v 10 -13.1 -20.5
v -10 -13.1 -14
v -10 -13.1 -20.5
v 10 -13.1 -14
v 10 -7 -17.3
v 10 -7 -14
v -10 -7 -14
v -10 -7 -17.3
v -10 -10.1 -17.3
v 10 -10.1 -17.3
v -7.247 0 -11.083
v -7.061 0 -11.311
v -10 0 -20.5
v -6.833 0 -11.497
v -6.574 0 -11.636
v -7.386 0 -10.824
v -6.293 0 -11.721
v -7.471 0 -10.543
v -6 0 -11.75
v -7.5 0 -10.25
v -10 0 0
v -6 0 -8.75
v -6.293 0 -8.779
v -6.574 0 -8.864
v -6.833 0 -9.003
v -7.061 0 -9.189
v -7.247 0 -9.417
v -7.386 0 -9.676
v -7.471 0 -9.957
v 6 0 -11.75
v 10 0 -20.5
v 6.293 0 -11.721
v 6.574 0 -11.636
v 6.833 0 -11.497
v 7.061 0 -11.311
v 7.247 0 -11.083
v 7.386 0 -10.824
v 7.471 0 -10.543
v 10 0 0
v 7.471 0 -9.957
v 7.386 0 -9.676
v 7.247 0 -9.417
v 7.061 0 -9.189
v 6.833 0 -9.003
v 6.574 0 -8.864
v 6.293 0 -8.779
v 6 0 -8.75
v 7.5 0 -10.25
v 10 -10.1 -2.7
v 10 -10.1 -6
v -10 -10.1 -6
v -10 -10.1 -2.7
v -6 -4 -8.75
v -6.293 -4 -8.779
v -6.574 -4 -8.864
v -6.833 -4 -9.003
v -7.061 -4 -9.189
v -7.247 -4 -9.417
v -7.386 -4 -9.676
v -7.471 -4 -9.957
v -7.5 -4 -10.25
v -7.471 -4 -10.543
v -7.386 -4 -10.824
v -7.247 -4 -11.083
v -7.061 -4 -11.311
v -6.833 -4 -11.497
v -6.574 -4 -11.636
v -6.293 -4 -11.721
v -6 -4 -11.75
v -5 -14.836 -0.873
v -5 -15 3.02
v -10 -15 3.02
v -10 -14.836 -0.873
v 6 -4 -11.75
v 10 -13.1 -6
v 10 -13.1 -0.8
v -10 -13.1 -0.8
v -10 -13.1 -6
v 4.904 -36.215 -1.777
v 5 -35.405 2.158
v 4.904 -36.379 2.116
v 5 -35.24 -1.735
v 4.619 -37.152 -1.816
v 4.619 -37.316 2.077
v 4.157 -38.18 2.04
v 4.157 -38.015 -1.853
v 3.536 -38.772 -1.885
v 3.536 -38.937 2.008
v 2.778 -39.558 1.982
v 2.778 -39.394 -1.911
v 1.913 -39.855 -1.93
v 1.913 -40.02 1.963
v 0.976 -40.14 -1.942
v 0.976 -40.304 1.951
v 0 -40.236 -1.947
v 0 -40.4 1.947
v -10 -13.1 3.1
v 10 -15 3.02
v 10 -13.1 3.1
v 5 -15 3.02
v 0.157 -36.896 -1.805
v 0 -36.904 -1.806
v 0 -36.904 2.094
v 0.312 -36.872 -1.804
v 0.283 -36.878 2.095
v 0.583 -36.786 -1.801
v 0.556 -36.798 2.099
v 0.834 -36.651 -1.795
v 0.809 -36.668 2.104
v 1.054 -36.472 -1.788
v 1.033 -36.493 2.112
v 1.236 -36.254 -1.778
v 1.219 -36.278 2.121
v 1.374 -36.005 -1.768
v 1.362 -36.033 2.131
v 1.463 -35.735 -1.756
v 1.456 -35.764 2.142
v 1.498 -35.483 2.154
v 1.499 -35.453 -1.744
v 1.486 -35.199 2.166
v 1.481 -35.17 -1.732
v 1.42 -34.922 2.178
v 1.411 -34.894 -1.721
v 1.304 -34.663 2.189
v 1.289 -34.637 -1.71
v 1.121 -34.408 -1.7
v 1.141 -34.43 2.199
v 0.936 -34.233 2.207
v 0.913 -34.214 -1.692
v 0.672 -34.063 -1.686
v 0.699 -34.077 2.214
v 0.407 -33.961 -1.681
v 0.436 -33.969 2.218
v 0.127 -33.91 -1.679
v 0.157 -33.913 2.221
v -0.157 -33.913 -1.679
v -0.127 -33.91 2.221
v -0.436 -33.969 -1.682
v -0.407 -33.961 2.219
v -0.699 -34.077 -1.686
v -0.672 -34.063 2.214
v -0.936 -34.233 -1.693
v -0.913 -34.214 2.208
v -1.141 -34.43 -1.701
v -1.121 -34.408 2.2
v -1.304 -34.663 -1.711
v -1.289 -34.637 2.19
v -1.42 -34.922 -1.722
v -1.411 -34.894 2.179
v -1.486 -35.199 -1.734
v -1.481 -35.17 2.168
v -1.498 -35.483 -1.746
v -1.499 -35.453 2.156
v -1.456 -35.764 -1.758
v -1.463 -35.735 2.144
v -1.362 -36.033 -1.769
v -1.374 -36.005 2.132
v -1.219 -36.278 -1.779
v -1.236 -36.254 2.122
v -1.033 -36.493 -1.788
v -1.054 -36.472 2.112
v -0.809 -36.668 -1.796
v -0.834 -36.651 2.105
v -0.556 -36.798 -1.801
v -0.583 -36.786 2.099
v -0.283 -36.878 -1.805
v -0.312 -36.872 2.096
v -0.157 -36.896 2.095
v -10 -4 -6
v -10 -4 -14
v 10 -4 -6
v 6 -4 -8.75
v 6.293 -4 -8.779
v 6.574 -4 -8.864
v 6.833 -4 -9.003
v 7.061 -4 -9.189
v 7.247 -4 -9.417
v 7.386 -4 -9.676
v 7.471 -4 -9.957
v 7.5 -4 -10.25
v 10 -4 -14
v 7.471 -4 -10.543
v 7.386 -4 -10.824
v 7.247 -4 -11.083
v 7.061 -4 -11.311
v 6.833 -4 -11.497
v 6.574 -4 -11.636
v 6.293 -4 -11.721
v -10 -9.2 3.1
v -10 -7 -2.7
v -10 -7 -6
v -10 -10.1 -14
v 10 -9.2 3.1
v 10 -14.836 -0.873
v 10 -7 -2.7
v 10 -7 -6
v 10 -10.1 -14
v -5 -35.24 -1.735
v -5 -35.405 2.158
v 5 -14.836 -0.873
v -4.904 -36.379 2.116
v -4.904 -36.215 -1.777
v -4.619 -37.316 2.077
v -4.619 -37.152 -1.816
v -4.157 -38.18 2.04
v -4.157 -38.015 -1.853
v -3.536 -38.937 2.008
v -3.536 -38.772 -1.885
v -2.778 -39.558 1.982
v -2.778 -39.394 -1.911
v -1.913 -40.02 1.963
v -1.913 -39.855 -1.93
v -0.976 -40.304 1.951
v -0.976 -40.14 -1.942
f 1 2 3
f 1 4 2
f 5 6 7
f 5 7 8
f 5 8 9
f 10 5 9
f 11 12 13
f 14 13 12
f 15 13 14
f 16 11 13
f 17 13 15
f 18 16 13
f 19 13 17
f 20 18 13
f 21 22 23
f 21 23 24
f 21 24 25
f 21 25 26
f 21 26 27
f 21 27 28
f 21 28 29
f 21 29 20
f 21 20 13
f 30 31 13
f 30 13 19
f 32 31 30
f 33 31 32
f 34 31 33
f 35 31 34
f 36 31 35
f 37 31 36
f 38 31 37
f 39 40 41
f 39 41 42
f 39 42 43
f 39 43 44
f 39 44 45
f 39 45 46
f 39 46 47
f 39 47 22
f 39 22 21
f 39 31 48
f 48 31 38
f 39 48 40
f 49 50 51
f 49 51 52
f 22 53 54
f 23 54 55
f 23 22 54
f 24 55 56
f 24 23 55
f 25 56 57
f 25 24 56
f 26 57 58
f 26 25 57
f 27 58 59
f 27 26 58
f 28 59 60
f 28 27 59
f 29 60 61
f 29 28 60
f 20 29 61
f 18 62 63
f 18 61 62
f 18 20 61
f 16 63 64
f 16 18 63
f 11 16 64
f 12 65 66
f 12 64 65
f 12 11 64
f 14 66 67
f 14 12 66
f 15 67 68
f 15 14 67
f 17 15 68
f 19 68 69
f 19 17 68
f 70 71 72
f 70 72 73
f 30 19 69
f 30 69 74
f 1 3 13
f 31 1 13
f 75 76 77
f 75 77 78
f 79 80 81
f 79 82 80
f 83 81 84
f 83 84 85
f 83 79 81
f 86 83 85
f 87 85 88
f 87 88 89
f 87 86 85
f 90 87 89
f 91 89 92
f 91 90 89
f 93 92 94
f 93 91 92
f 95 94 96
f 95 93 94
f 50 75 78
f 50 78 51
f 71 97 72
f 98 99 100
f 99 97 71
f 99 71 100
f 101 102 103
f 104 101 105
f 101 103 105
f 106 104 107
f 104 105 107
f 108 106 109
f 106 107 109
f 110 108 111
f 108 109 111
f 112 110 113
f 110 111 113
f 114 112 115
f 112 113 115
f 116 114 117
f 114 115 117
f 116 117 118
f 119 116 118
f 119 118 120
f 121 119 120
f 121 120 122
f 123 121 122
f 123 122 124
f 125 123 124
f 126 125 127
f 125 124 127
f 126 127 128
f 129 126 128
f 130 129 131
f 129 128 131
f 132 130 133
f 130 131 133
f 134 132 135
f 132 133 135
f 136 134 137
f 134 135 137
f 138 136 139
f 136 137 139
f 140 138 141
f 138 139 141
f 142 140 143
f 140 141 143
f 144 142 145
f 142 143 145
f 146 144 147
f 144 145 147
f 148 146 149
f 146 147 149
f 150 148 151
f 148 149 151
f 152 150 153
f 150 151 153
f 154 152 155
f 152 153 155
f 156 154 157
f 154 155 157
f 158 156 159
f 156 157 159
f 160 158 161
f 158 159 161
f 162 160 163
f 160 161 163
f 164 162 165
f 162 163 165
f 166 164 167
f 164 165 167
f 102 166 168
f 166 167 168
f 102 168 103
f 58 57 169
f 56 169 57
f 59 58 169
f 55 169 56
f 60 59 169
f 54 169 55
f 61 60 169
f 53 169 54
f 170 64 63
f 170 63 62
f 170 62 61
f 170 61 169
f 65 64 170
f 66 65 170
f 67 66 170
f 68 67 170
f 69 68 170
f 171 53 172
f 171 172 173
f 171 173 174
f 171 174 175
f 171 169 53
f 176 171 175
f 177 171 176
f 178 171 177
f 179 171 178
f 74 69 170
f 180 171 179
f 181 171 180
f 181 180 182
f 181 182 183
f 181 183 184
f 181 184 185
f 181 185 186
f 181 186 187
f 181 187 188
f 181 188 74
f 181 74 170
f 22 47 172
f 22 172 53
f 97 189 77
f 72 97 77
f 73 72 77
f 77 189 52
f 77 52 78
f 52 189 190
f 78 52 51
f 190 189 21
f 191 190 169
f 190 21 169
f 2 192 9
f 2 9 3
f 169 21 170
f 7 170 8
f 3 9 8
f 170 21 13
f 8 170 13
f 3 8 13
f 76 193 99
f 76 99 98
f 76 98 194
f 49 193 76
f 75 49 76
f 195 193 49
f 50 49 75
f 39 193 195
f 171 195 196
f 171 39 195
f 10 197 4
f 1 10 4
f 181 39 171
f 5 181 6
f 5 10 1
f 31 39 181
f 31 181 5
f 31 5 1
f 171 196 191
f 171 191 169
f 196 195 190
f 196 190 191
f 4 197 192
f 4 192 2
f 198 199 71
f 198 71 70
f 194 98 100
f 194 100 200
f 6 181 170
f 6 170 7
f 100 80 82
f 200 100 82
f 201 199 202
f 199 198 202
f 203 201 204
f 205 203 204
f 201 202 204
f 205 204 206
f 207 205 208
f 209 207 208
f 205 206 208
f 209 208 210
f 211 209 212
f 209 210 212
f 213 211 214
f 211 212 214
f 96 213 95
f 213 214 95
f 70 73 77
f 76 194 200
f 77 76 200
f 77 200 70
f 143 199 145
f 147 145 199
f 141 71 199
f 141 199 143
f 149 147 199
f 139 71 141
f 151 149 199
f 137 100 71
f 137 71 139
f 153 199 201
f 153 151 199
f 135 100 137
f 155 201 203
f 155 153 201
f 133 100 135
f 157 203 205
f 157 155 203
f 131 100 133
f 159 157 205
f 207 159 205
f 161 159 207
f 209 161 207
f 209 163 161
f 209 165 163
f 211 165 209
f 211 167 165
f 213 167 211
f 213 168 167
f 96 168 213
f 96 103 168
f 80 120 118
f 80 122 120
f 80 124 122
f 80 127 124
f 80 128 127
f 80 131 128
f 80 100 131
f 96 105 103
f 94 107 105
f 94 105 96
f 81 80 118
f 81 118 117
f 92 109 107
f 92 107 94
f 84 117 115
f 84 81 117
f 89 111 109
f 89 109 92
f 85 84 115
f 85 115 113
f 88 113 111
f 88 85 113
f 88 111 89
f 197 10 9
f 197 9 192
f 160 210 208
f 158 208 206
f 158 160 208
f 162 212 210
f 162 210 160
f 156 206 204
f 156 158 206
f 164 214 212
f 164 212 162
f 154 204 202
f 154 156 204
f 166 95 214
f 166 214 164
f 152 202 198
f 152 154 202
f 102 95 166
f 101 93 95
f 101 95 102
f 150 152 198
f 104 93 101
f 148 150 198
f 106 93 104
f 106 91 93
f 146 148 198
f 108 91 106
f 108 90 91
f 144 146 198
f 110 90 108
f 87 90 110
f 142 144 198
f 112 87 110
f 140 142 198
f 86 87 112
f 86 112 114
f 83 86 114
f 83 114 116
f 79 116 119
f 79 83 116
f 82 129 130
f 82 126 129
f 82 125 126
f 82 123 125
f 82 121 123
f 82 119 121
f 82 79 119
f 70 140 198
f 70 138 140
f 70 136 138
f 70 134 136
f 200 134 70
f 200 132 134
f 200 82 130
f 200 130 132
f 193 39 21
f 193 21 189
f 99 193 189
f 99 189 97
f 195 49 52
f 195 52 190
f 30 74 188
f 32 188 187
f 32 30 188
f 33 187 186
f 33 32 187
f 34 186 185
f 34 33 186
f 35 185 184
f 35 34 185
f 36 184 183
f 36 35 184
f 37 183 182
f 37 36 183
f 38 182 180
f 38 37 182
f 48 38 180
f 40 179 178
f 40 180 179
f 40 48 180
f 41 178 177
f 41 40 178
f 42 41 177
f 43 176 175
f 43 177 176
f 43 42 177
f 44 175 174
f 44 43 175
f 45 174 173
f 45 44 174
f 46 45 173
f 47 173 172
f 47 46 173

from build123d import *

# Parameters (mm, degrees)
SALIENTE_EXTRUIR1_DEPTH = 10
SALIENTE_EXTRUIR2_DEPTH = 5
REDONDEO1_R             = 5
CORTAR_EXTRUIR2_REACH   = 48.394
CROQUIS4_R              = 1.5
CORTAR_EXTRUIR3_DEPTH   = 5


with BuildPart() as part:
    # Croquis1 → Saliente-Extruir1 (new, symmetric)
    with BuildSketch(Plane(origin=(0, 0, 0), x_dir=(0, 0, -1), z_dir=(1, 0, 0))):
        Polygon((20.5, 0), (0, 0), (-3.1, -9.2), (-3.1, -13.1), (-3.019721522, -15), (0.873328538, -14.835511509), (0.8, -13.1), (6, -13.1), (6, -10.1), (2.7, -10.1), (2.7, -7), (6, -7), (6, -4), (14, -4), (14, -7), (17.3, -7), (17.3, -10.1), (14, -10.1), (14, -13.1), (20.5, -13.1), align=None)
    extrude(amount=SALIENTE_EXTRUIR1_DEPTH, both=True)

    # Croquis1<4> → Saliente-Extruir2 (add, symmetric)
    with BuildSketch(Plane(origin=(0, 0, 0), x_dir=(0, 0, -1), z_dir=(1, 0, 0))):
        Polygon((0.873328538, -14.835511509), (-3.019721522, -15), (-1.94652503, -40.4), (1.94652503, -40.235511509), align=None)
    extrude(amount=SALIENTE_EXTRUIR2_DEPTH, both=True)

    # Redondeo1
    redondeo1_edges = [part.edges().sort_by_distance(p)[0] for p in [
        (-5, -40.317755755, 0),
        (5, -40.317755755, 0),
    ]]
    fillet(redondeo1_edges, radius=REDONDEO1_R - 0.0001)  # a hair under: the kernel refuses the full size

    # Croquis3 → Cortar-Extruir2 (cut, up to next)
    with BuildSketch(Plane(origin=(0, 0, 0), x_dir=(1, 0, 0), z_dir=(0, 1, 0)), mode=Mode.PRIVATE) as cortar_extruir2_sk1:
        with BuildLine():
            Line((-6, 11.75), (6, 11.75))
            ThreePointArc((6, 11.75), (7.5, 10.25), (6, 8.75))
            Line((6, 8.75), (-6, 8.75))
            ThreePointArc((-6, 8.75), (-7.5, 10.25), (-6, 11.75))
        make_face()
    cortar_extruir2_tool1 = extrude(cortar_extruir2_sk1.sketch, amount=-CORTAR_EXTRUIR2_REACH, mode=Mode.PRIVATE) & part.part
    add(cortar_extruir2_tool1.solids().sort_by_distance((0, 0, -10.25))[0], mode=Mode.SUBTRACT)

    # Croquis4 → Cortar-Extruir3 (cut, symmetric)
    with BuildSketch(Plane.XY):
        with Locations(Location((0, -35.404457076, 0), (0, 0, 270))):
            Circle(CROQUIS4_R)
    extrude(amount=CORTAR_EXTRUIR3_DEPTH, both=True, mode=Mode.SUBTRACT)


solid = part.part
